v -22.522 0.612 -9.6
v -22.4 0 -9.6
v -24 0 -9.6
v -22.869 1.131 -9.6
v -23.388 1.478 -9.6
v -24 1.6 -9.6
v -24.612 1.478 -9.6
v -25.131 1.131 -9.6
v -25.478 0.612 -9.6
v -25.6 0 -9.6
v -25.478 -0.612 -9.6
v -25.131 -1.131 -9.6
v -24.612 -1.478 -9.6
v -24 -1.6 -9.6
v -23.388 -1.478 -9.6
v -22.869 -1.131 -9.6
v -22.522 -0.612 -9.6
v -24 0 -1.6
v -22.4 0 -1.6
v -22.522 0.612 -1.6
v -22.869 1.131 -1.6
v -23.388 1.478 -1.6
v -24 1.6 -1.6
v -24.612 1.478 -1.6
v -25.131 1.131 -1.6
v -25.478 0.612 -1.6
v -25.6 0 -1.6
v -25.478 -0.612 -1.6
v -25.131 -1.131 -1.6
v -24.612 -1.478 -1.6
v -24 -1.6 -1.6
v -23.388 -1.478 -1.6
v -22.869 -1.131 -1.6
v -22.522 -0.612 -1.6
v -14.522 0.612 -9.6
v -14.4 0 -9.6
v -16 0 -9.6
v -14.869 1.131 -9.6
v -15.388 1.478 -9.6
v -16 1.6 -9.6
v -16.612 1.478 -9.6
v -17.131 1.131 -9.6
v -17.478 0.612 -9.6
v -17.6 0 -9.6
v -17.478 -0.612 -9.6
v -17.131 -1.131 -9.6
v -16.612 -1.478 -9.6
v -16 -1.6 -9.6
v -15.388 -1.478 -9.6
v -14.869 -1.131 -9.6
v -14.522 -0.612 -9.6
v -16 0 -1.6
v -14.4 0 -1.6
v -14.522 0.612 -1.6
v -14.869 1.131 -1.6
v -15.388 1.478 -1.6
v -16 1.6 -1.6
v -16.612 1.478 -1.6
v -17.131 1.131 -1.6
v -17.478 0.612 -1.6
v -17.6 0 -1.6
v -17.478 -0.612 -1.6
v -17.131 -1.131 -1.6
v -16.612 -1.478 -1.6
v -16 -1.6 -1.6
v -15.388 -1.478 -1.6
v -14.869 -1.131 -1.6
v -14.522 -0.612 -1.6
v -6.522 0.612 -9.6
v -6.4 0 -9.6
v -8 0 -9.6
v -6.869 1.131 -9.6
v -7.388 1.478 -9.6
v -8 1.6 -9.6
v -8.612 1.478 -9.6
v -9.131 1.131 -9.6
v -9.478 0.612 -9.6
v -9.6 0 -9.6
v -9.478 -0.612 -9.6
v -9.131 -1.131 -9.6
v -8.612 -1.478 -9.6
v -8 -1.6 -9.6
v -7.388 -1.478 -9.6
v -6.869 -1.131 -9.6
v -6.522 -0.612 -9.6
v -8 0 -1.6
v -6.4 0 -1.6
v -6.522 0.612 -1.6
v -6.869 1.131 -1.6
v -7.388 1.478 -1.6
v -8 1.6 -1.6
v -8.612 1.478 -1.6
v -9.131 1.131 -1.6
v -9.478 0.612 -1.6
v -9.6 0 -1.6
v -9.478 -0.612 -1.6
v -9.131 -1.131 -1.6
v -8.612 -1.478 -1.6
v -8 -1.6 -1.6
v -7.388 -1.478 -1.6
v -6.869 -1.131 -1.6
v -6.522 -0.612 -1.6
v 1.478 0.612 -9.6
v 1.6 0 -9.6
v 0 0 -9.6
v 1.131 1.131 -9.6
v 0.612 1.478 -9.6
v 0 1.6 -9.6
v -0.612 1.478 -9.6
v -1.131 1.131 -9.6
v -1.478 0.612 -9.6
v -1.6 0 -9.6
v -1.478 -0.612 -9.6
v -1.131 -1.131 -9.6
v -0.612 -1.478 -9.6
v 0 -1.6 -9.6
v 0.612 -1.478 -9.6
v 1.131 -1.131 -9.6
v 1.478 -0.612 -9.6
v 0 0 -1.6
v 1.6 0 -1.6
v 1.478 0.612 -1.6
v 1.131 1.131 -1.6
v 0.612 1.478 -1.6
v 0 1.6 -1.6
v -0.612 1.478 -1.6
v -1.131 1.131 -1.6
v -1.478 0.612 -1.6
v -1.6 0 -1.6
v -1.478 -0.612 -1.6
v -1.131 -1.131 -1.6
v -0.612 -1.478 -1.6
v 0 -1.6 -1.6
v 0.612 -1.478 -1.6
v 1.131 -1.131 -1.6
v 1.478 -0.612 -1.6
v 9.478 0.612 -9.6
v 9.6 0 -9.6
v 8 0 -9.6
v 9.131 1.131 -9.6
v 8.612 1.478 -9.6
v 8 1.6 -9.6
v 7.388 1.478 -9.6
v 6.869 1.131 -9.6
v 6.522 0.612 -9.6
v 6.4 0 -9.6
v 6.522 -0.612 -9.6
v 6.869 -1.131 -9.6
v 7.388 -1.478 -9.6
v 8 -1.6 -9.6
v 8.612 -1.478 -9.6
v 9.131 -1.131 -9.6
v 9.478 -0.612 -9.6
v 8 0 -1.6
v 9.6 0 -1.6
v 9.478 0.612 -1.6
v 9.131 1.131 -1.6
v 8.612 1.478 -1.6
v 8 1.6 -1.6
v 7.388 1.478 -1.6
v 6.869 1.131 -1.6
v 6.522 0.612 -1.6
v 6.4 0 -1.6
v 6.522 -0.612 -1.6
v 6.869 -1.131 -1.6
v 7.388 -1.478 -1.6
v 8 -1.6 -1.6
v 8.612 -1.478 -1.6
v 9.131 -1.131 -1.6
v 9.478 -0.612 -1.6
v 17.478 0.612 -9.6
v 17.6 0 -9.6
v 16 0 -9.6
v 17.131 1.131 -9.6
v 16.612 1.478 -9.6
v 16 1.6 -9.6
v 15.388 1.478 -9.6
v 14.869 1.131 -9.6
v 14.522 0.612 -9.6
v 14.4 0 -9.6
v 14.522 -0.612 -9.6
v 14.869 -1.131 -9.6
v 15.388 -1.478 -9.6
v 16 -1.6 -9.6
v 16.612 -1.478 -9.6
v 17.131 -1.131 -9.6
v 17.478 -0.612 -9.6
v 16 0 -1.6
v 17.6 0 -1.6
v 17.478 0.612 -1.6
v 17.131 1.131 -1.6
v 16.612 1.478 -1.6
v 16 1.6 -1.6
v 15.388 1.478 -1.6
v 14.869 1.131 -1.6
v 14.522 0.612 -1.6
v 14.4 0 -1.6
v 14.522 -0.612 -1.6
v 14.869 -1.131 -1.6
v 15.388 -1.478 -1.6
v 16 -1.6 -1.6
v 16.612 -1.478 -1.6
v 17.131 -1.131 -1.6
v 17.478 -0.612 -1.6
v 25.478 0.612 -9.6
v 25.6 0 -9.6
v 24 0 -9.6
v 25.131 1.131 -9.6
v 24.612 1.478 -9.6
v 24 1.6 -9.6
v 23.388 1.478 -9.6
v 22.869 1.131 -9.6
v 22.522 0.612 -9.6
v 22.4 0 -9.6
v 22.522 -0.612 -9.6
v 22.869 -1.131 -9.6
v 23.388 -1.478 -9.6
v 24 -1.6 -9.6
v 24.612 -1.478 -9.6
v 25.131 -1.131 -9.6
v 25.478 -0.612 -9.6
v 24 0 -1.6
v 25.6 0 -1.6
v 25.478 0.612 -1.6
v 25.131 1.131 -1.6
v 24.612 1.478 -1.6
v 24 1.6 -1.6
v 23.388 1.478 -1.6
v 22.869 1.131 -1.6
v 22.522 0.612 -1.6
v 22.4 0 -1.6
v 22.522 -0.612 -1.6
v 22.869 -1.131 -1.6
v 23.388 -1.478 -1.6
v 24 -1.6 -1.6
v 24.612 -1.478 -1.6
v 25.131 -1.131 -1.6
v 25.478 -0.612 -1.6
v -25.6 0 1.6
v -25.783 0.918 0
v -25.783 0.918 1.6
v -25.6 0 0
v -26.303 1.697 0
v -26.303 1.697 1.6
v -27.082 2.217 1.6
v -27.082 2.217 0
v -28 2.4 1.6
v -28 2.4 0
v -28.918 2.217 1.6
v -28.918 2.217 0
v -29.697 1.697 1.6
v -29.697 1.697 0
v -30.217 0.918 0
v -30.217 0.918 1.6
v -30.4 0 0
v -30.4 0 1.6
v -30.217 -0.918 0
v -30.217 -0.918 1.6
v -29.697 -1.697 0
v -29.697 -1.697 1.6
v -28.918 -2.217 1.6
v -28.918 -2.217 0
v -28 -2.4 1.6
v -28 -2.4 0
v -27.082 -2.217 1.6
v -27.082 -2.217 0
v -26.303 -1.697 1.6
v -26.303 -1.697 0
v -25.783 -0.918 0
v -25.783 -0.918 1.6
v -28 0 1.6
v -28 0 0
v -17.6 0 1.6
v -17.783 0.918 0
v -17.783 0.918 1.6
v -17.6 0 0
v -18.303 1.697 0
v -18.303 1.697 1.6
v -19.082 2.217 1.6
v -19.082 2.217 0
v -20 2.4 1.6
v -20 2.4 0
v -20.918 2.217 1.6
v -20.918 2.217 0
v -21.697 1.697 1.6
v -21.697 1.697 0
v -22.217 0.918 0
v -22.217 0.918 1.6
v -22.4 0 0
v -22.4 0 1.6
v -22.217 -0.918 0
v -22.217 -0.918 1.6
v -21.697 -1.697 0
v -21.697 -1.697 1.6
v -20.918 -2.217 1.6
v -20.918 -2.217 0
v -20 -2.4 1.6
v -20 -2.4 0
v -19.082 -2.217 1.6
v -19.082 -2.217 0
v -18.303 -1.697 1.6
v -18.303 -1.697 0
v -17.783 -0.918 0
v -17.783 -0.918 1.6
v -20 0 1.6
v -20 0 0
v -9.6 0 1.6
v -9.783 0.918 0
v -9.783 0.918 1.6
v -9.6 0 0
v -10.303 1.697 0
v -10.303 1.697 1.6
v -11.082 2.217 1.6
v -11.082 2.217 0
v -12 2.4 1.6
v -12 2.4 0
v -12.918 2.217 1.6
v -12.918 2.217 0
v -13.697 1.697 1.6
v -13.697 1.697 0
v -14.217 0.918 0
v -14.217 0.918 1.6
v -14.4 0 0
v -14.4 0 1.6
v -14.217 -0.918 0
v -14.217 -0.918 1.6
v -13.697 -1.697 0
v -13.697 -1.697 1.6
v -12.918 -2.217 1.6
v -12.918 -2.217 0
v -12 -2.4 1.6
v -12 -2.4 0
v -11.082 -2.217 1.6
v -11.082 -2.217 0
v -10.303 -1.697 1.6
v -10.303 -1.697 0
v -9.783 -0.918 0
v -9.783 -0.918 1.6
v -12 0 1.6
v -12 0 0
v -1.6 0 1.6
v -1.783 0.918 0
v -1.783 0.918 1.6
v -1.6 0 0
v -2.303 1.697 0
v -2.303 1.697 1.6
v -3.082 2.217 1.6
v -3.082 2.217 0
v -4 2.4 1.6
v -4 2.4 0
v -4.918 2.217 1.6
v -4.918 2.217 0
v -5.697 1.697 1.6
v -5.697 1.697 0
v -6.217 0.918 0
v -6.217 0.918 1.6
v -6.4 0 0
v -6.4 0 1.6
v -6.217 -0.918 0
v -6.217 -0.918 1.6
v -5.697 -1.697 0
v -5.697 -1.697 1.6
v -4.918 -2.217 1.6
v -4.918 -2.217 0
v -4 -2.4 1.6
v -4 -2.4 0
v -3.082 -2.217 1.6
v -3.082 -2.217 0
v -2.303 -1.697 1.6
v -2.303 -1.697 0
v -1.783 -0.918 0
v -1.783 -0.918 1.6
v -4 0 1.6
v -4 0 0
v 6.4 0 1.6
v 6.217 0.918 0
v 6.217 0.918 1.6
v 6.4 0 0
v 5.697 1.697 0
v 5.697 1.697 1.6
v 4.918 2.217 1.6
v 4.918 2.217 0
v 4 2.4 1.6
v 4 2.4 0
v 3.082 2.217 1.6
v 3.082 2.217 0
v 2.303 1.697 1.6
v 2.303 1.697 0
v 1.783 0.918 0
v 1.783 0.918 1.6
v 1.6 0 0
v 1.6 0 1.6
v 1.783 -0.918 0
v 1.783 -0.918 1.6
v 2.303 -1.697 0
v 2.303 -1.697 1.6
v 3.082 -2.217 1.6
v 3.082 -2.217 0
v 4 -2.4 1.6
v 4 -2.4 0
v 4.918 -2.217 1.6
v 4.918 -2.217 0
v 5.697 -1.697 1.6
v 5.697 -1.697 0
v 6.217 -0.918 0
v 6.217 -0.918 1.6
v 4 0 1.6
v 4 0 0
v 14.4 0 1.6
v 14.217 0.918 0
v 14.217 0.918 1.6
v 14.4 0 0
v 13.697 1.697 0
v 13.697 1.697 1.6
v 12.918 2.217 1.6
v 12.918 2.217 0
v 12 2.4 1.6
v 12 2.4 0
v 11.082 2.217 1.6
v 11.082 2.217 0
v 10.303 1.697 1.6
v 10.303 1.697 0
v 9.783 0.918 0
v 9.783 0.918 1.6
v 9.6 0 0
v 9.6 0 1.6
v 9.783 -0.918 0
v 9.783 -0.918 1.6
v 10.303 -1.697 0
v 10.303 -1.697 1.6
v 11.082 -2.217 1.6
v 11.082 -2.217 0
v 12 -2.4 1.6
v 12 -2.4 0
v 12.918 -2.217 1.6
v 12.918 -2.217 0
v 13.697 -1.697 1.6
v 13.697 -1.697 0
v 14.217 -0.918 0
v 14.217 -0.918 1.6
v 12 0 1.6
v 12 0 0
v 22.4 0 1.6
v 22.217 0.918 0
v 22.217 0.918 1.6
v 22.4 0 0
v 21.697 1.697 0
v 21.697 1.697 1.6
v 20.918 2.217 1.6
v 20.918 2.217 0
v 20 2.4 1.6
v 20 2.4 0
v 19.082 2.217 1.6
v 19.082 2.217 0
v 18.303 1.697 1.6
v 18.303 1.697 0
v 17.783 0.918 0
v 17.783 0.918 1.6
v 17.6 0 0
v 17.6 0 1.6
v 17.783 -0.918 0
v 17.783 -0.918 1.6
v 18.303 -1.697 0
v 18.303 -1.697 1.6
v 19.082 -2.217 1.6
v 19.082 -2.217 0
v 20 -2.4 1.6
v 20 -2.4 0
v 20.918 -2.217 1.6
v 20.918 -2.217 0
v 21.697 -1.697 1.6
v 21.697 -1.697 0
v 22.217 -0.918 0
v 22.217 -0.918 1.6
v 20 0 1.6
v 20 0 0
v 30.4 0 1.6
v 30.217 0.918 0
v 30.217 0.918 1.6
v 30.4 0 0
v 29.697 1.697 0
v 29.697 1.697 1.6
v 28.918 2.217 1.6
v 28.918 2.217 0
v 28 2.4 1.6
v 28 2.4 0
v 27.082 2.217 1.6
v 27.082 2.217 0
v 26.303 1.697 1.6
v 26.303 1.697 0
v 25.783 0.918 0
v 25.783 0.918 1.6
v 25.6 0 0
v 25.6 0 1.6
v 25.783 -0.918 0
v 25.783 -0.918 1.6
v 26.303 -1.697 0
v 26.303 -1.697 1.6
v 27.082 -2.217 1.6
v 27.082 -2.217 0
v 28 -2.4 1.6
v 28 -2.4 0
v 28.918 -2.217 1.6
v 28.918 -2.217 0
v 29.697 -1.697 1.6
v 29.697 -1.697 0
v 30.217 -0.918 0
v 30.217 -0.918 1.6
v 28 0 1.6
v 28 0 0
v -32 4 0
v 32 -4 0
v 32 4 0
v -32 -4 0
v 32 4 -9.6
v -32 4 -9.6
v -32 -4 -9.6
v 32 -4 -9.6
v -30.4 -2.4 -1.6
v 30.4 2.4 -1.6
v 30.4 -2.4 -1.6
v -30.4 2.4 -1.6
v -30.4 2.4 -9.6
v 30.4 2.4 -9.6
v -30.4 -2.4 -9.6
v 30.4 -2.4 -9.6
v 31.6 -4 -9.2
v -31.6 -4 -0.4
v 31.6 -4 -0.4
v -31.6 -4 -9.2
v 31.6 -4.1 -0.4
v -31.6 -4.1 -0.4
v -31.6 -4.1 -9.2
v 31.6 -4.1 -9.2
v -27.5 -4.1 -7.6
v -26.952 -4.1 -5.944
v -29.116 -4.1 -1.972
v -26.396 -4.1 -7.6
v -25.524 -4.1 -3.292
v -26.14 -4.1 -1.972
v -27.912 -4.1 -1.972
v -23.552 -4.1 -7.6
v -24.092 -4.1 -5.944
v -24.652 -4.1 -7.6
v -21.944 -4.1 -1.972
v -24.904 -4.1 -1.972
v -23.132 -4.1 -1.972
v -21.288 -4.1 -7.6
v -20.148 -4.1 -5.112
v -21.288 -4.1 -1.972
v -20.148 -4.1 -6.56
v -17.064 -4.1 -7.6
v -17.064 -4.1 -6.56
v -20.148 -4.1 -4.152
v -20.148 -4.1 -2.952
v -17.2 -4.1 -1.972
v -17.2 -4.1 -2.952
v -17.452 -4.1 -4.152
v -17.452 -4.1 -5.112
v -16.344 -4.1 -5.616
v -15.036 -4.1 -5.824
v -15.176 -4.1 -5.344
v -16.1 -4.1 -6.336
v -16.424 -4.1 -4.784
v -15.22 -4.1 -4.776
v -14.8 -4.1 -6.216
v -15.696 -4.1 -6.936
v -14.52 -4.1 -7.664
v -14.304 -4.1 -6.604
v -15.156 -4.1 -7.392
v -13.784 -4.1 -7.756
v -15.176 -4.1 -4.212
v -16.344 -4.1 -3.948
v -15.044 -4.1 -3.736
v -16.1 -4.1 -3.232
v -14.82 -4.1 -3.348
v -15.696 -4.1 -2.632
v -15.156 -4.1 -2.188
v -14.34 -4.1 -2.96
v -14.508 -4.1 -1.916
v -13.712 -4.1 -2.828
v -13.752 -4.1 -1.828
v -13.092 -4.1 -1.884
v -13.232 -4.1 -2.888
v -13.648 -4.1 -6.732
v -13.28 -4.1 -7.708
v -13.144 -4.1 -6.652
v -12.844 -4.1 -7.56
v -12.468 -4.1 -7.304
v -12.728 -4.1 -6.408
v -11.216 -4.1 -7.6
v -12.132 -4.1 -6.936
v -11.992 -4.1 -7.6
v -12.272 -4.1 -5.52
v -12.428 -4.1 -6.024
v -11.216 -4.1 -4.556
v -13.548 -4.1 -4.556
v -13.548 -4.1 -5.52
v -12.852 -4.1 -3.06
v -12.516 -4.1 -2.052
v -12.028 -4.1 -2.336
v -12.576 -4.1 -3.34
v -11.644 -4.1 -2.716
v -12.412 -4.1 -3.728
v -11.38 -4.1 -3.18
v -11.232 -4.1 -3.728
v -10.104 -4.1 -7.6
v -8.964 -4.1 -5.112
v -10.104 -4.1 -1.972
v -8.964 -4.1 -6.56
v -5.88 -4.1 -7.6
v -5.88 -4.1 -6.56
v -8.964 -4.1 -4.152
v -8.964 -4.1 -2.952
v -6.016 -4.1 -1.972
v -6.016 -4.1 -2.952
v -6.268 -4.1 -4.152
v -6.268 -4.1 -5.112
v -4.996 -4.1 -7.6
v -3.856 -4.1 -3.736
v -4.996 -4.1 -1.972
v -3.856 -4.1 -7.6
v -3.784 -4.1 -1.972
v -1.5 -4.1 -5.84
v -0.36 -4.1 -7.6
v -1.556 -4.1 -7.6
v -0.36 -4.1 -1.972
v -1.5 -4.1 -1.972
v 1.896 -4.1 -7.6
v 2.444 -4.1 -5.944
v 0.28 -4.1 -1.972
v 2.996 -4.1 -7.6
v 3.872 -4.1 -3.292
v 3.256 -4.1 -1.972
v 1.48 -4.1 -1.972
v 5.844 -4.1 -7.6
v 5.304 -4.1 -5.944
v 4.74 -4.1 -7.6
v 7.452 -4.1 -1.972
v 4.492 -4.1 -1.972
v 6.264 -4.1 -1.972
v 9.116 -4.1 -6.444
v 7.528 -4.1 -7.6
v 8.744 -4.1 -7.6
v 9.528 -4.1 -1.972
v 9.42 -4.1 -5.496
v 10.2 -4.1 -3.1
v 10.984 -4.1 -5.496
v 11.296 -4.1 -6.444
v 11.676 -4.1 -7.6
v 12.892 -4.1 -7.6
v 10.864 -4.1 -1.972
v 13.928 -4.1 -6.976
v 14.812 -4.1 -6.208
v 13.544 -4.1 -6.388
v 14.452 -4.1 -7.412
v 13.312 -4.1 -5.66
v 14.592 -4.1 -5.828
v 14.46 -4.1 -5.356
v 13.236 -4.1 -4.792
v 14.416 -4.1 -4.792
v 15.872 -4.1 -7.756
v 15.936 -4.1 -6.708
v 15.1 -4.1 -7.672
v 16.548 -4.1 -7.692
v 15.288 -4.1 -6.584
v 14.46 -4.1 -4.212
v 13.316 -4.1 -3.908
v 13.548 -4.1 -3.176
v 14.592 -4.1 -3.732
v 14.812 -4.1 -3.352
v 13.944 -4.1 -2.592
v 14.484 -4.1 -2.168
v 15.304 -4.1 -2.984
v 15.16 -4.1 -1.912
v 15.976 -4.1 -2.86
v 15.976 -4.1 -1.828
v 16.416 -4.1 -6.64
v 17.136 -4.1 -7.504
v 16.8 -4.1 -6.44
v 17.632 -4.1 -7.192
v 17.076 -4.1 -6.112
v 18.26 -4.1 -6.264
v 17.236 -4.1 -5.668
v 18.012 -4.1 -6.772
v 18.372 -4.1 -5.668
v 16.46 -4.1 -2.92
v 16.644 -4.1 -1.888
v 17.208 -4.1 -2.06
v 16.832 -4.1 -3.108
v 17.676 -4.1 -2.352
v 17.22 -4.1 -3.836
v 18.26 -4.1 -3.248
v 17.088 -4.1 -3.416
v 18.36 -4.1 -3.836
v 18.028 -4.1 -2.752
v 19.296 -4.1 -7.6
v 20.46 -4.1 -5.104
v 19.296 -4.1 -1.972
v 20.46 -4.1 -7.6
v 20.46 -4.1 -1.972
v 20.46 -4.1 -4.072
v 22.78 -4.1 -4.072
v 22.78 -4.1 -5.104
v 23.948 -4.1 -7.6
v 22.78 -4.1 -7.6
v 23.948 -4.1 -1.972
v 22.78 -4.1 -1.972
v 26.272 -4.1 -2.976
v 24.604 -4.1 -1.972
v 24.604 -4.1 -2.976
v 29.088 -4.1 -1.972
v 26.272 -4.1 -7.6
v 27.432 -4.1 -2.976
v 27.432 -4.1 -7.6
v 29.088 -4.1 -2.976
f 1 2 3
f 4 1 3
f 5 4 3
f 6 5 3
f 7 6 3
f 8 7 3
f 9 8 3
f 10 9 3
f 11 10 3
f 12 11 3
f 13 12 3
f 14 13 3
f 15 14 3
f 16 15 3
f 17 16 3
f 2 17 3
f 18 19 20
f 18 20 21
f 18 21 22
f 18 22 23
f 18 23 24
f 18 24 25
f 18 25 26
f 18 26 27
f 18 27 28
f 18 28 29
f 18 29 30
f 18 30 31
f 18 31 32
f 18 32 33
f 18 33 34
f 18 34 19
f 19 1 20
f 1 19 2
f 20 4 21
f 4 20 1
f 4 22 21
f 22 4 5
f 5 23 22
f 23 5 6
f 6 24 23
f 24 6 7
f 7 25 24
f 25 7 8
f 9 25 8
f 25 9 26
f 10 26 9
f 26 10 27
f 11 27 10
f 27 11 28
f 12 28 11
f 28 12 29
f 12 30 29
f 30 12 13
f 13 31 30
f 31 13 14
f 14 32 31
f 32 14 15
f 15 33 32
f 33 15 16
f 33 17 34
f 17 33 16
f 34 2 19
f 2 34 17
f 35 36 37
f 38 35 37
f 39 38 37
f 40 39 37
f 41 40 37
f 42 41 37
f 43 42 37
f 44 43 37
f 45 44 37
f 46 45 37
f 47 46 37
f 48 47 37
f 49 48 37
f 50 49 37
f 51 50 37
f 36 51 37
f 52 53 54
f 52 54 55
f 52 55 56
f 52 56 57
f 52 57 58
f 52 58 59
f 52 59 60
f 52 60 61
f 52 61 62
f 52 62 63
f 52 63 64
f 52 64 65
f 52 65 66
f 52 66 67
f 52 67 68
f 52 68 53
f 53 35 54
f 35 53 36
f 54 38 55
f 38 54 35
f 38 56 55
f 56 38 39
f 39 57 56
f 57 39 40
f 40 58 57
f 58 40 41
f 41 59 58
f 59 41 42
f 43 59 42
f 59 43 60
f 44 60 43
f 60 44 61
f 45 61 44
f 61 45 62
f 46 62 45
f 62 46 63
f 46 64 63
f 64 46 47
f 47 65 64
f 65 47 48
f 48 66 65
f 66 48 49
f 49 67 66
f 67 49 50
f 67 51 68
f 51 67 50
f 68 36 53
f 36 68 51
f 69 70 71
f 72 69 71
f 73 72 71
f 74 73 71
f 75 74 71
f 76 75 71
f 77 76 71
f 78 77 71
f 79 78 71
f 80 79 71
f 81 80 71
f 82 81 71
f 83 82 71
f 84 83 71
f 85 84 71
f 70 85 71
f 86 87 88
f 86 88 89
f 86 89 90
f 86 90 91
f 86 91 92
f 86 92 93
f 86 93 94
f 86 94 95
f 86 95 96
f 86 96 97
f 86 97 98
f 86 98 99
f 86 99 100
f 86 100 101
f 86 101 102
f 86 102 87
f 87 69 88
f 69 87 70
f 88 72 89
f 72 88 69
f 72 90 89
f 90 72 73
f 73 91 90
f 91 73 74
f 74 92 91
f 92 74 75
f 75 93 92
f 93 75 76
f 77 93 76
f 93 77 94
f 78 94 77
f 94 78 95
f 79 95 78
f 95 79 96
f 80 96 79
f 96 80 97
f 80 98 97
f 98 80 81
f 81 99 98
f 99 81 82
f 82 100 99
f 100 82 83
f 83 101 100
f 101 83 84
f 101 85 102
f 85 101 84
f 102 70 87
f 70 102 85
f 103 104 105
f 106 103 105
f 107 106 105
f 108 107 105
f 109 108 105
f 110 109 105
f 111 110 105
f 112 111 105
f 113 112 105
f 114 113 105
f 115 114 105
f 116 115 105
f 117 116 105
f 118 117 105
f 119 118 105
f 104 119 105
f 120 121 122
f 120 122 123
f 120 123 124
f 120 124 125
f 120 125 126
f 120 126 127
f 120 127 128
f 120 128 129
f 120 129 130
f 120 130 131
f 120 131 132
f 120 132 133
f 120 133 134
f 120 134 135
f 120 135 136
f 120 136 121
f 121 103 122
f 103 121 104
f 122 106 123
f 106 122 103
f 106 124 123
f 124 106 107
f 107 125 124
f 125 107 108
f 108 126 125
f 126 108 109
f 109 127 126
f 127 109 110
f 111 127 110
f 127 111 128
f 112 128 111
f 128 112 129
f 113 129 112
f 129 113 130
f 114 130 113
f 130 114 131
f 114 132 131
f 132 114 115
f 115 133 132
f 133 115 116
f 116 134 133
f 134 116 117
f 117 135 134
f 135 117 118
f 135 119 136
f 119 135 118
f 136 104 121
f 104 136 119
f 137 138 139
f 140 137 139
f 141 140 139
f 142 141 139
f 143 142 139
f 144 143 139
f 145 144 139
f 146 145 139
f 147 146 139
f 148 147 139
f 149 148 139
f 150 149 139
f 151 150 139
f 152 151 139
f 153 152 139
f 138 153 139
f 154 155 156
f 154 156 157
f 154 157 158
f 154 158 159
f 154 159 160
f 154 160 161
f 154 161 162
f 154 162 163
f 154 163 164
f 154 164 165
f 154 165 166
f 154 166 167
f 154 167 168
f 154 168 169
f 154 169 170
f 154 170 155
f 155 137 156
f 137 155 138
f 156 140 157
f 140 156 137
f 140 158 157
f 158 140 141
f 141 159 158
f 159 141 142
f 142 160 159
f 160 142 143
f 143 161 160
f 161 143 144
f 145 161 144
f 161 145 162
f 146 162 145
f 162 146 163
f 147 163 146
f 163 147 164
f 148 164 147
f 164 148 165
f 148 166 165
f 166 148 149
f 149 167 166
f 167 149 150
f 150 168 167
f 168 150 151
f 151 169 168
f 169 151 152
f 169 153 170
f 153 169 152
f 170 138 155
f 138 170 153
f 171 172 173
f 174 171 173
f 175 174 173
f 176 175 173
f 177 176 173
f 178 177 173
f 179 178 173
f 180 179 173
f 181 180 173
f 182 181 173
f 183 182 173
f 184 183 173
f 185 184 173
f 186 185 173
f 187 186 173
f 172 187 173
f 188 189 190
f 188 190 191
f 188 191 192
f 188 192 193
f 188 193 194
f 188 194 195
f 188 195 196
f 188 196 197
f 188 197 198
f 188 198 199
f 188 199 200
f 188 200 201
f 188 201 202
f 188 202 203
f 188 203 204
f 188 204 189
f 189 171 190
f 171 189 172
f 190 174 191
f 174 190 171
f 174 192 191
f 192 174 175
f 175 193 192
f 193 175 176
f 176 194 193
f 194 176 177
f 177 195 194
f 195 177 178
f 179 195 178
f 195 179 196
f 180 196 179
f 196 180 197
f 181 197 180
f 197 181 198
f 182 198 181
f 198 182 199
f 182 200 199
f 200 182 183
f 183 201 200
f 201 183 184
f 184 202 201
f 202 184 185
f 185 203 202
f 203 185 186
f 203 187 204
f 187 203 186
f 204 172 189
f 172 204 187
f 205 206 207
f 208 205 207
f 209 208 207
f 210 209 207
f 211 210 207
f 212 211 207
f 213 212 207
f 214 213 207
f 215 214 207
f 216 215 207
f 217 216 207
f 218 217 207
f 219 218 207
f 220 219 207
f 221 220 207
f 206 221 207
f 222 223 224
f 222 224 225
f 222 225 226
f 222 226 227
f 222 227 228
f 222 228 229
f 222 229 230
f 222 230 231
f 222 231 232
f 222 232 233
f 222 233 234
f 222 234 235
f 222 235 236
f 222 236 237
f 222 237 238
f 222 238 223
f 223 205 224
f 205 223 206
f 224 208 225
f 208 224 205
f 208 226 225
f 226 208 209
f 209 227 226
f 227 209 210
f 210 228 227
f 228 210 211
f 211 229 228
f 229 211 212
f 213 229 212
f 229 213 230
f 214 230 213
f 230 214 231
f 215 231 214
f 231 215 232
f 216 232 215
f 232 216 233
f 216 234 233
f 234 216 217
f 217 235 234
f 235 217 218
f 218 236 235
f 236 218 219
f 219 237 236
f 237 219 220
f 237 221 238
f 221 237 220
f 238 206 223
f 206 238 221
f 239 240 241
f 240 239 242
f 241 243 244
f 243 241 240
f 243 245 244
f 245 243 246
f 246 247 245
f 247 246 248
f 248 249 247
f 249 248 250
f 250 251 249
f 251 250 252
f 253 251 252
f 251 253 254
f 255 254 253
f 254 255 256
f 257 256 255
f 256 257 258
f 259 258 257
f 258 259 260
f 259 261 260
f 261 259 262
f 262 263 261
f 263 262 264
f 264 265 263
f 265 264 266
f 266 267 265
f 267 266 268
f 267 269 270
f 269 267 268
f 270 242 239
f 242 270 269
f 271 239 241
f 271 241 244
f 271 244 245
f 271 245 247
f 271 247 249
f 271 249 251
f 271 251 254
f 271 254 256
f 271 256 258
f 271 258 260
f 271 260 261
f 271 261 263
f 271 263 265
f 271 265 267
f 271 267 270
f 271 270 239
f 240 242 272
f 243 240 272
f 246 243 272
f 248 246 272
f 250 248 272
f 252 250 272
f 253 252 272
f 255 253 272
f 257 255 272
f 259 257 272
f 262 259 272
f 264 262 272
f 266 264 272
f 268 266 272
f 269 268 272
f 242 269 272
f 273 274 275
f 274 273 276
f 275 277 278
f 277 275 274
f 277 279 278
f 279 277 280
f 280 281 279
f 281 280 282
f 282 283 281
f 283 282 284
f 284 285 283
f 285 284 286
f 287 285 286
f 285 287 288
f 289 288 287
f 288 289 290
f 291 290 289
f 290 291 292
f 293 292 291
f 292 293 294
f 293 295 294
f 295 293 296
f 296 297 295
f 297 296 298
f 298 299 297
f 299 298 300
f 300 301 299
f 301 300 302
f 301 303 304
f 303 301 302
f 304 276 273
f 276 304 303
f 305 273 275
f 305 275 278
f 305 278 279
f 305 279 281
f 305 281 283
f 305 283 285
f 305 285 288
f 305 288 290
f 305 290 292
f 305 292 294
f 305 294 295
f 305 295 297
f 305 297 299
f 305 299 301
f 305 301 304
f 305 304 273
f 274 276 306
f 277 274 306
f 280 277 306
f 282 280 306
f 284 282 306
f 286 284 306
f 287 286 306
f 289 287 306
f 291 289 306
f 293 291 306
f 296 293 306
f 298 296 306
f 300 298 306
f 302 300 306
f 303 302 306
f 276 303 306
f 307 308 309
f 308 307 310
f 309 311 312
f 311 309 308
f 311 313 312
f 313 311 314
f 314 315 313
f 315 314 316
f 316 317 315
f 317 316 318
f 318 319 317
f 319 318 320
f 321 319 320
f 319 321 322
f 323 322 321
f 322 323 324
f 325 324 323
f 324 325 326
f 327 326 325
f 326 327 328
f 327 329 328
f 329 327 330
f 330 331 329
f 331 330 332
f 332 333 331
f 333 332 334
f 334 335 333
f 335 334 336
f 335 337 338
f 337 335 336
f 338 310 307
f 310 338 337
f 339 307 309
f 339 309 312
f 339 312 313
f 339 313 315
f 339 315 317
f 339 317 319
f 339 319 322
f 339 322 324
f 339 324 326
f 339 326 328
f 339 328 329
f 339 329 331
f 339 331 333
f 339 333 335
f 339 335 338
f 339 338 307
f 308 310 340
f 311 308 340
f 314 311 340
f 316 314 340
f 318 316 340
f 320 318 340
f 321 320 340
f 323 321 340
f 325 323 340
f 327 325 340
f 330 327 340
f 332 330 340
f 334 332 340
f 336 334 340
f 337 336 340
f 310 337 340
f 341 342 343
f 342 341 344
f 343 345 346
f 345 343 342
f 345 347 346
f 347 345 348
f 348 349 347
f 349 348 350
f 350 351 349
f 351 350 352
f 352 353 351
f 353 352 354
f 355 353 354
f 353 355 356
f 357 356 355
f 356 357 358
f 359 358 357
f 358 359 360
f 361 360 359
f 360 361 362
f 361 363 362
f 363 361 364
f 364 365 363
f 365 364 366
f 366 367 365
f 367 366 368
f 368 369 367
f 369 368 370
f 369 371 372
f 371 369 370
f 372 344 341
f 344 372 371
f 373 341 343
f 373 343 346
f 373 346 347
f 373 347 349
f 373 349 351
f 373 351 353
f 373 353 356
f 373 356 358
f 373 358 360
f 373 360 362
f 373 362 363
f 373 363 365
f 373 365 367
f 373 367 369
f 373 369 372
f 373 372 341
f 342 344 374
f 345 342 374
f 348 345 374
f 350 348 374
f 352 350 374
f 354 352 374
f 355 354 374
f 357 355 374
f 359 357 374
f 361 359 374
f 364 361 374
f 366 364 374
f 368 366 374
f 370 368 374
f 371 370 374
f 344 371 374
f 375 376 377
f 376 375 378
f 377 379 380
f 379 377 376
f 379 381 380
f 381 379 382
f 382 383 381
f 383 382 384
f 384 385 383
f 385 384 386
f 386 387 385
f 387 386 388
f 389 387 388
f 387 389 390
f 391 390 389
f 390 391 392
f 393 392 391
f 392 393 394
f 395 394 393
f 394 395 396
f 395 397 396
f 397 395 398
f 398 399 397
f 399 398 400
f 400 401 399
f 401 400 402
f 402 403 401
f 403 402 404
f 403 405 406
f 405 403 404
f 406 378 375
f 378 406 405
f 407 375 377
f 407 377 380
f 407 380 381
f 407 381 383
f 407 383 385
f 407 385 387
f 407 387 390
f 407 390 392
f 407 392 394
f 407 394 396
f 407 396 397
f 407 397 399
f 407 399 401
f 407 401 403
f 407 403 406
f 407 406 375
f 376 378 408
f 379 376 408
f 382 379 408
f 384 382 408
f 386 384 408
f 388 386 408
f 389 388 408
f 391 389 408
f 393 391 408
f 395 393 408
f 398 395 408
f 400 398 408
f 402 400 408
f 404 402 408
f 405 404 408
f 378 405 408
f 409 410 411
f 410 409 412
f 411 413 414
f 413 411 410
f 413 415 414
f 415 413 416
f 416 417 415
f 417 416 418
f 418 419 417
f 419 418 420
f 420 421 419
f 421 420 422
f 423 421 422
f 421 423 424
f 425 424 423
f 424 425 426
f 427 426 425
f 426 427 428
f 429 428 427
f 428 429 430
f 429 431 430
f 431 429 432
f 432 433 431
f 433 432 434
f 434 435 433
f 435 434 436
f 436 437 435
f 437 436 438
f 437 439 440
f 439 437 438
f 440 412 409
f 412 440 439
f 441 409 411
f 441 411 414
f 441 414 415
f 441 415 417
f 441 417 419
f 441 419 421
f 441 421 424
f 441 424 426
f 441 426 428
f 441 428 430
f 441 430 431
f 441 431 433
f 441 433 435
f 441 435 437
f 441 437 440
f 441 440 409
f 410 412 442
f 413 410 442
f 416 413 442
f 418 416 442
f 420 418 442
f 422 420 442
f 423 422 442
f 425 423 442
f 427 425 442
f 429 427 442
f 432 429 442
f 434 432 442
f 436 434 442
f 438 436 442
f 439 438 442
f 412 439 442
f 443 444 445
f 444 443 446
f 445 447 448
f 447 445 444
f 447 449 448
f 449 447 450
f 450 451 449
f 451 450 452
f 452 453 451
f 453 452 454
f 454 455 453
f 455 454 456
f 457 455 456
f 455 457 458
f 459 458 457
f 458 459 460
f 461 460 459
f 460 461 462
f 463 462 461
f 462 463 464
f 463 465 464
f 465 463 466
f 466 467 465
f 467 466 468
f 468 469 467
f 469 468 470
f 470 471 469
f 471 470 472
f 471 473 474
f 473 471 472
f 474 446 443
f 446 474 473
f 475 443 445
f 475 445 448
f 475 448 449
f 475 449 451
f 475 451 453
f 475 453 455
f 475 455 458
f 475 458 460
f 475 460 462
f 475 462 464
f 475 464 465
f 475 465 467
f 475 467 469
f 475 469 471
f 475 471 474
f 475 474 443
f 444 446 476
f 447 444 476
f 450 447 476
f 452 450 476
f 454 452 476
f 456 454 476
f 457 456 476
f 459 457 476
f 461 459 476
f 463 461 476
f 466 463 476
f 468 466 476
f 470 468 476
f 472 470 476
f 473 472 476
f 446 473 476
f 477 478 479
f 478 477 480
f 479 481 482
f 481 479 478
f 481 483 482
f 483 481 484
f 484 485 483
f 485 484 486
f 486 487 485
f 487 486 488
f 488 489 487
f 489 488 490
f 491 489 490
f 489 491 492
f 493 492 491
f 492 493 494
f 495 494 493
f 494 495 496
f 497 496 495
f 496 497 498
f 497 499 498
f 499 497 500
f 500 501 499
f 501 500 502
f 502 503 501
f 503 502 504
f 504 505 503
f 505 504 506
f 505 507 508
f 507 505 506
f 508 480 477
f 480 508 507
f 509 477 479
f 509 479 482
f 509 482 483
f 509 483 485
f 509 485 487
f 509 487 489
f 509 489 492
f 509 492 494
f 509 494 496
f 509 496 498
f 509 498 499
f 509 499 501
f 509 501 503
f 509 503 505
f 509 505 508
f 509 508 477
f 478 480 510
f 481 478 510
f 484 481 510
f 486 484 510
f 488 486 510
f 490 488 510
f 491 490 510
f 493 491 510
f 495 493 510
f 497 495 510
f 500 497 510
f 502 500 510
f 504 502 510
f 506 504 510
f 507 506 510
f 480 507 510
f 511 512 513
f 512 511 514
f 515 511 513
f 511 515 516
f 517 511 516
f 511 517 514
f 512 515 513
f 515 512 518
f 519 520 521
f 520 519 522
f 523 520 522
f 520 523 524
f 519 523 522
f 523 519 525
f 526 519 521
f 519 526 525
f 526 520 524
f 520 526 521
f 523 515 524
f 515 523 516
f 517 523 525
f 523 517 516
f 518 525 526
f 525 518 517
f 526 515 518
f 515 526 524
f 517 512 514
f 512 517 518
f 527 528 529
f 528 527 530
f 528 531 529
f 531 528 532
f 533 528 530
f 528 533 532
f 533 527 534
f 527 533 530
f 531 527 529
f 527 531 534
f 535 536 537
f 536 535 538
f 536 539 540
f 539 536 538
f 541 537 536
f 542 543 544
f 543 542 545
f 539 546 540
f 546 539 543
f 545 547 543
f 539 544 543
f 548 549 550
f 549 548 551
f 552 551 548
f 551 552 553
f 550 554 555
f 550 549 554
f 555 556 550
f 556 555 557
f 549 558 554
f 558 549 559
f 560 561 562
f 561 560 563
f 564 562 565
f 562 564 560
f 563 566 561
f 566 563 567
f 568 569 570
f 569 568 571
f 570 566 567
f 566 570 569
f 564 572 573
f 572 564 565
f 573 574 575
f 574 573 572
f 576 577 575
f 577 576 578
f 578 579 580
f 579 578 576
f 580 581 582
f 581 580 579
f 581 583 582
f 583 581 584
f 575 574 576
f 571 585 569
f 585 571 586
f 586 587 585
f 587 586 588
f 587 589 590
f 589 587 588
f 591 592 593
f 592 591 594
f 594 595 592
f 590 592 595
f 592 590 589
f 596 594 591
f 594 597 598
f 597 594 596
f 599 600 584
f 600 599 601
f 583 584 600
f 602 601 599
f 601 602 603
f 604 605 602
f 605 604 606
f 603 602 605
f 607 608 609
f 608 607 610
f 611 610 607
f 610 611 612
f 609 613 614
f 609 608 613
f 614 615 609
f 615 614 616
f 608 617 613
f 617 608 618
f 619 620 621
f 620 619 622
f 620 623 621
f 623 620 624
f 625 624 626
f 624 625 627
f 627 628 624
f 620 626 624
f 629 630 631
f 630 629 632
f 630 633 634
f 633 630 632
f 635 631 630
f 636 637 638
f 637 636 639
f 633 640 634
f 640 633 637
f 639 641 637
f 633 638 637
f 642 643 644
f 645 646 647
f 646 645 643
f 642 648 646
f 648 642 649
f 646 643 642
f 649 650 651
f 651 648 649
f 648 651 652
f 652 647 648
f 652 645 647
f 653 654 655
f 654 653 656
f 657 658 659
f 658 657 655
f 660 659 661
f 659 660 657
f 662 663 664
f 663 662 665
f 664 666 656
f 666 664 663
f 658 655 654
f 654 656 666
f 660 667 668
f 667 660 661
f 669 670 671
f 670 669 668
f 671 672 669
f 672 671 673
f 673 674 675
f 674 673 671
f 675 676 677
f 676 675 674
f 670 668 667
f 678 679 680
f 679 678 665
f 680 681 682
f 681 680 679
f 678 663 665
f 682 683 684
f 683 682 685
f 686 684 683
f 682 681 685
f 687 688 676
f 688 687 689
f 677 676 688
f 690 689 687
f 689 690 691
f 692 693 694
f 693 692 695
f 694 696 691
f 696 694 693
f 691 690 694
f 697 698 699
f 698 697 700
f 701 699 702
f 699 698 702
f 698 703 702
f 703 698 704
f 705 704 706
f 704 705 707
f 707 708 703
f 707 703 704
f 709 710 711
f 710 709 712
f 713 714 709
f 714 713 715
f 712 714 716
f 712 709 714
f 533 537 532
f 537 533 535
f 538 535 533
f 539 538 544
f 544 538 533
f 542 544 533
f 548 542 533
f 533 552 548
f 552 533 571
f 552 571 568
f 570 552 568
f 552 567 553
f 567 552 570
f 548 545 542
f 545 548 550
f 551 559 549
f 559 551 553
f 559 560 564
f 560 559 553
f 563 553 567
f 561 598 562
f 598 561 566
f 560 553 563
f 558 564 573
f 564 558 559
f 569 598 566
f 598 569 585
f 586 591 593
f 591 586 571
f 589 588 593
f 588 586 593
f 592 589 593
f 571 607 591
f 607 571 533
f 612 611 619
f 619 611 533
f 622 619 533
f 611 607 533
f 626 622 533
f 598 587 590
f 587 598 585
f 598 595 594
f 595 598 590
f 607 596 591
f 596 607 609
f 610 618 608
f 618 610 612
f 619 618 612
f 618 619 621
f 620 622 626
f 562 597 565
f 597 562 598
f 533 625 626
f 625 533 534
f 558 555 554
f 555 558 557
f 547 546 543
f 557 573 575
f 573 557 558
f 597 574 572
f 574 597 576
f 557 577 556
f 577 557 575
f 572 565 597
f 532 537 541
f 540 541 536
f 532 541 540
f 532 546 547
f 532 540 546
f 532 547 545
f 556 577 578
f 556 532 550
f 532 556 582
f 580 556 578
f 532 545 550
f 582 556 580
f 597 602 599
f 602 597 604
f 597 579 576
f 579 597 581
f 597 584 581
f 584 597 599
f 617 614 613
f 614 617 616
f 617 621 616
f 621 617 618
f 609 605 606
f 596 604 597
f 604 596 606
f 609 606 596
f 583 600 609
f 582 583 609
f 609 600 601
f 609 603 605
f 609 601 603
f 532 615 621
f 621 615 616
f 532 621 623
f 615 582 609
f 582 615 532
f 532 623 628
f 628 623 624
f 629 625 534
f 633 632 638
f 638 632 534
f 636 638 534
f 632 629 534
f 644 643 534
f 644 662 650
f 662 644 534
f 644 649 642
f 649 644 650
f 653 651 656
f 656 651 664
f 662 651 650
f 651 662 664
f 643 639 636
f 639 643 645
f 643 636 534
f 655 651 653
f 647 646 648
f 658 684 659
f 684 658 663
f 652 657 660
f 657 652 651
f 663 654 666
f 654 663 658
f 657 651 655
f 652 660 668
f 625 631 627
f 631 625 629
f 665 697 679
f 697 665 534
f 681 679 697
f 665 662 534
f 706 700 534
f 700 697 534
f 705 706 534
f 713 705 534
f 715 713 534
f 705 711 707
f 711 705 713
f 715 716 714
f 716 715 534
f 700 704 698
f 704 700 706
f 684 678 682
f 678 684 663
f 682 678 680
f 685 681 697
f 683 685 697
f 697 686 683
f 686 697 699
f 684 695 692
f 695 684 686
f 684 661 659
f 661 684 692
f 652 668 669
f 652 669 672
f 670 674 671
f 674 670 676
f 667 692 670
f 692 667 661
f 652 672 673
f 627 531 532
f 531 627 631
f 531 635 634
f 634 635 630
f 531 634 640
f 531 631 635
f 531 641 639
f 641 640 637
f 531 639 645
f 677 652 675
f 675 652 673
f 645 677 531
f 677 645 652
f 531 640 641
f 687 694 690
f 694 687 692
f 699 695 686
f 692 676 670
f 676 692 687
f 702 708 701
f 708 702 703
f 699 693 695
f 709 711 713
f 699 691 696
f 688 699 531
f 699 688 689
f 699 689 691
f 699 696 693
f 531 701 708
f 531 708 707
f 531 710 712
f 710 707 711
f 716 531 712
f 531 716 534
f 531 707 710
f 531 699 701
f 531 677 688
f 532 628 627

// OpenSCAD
use <../lib.scad>
use <194535d.scad>
use <3008.scad>
function ldraw_lib__3008d06() = [
// 0 Brick  1 x  8 with Yellow "WEGENWACHT" Sticker
// 0 Name: 3008d06.dat
// 0 Author: Takeshi Takahashi [RainbowDolphin]
// 0 !LDRAW_ORG Shortcut UPDATE 2024-07
// 0 !LICENSE Licensed under CC BY 4.0 : see CAreadme.txt
// 
// 0 BFC CERTIFY CCW
  [0,"BFC","CERTIFY"],
  [0,"BFC","CCW"],
// 
// 0 !CATEGORY Sticker Shortcut
// 0 !KEYWORDS Breakdown assistance, Bricklink 3008pb087, Set 1590-2
// 
// 0 !HISTORY 2024-08-26 [OrionP] Official Update 2024-07
// 
// 1 16 0 0 0 1 0 0 0 1 0 0 0 1 3008.dat
  [1,16,0,0,0,1,0,0,0,1,0,0,0,1, ldraw_lib__3008()],
// 1 16 0 12 -10 1 0 0 0 0 -1 0 1 0 194535d.dat
  [1,16,0,12,-10,1,0,0,0,0,-1,0,1,0, ldraw_lib__194535d()],
];
module ldraw_lib__3008d06(step=0, col=false, unit=2/5, alt=false, line=0.2, solid=!$preview)
    makepoly(ldraw_lib__3008d06(), step=step, col=col, unit=unit, alt=alt, line=line, solid=solid);
ldraw_lib__3008d06(line=0.2);
